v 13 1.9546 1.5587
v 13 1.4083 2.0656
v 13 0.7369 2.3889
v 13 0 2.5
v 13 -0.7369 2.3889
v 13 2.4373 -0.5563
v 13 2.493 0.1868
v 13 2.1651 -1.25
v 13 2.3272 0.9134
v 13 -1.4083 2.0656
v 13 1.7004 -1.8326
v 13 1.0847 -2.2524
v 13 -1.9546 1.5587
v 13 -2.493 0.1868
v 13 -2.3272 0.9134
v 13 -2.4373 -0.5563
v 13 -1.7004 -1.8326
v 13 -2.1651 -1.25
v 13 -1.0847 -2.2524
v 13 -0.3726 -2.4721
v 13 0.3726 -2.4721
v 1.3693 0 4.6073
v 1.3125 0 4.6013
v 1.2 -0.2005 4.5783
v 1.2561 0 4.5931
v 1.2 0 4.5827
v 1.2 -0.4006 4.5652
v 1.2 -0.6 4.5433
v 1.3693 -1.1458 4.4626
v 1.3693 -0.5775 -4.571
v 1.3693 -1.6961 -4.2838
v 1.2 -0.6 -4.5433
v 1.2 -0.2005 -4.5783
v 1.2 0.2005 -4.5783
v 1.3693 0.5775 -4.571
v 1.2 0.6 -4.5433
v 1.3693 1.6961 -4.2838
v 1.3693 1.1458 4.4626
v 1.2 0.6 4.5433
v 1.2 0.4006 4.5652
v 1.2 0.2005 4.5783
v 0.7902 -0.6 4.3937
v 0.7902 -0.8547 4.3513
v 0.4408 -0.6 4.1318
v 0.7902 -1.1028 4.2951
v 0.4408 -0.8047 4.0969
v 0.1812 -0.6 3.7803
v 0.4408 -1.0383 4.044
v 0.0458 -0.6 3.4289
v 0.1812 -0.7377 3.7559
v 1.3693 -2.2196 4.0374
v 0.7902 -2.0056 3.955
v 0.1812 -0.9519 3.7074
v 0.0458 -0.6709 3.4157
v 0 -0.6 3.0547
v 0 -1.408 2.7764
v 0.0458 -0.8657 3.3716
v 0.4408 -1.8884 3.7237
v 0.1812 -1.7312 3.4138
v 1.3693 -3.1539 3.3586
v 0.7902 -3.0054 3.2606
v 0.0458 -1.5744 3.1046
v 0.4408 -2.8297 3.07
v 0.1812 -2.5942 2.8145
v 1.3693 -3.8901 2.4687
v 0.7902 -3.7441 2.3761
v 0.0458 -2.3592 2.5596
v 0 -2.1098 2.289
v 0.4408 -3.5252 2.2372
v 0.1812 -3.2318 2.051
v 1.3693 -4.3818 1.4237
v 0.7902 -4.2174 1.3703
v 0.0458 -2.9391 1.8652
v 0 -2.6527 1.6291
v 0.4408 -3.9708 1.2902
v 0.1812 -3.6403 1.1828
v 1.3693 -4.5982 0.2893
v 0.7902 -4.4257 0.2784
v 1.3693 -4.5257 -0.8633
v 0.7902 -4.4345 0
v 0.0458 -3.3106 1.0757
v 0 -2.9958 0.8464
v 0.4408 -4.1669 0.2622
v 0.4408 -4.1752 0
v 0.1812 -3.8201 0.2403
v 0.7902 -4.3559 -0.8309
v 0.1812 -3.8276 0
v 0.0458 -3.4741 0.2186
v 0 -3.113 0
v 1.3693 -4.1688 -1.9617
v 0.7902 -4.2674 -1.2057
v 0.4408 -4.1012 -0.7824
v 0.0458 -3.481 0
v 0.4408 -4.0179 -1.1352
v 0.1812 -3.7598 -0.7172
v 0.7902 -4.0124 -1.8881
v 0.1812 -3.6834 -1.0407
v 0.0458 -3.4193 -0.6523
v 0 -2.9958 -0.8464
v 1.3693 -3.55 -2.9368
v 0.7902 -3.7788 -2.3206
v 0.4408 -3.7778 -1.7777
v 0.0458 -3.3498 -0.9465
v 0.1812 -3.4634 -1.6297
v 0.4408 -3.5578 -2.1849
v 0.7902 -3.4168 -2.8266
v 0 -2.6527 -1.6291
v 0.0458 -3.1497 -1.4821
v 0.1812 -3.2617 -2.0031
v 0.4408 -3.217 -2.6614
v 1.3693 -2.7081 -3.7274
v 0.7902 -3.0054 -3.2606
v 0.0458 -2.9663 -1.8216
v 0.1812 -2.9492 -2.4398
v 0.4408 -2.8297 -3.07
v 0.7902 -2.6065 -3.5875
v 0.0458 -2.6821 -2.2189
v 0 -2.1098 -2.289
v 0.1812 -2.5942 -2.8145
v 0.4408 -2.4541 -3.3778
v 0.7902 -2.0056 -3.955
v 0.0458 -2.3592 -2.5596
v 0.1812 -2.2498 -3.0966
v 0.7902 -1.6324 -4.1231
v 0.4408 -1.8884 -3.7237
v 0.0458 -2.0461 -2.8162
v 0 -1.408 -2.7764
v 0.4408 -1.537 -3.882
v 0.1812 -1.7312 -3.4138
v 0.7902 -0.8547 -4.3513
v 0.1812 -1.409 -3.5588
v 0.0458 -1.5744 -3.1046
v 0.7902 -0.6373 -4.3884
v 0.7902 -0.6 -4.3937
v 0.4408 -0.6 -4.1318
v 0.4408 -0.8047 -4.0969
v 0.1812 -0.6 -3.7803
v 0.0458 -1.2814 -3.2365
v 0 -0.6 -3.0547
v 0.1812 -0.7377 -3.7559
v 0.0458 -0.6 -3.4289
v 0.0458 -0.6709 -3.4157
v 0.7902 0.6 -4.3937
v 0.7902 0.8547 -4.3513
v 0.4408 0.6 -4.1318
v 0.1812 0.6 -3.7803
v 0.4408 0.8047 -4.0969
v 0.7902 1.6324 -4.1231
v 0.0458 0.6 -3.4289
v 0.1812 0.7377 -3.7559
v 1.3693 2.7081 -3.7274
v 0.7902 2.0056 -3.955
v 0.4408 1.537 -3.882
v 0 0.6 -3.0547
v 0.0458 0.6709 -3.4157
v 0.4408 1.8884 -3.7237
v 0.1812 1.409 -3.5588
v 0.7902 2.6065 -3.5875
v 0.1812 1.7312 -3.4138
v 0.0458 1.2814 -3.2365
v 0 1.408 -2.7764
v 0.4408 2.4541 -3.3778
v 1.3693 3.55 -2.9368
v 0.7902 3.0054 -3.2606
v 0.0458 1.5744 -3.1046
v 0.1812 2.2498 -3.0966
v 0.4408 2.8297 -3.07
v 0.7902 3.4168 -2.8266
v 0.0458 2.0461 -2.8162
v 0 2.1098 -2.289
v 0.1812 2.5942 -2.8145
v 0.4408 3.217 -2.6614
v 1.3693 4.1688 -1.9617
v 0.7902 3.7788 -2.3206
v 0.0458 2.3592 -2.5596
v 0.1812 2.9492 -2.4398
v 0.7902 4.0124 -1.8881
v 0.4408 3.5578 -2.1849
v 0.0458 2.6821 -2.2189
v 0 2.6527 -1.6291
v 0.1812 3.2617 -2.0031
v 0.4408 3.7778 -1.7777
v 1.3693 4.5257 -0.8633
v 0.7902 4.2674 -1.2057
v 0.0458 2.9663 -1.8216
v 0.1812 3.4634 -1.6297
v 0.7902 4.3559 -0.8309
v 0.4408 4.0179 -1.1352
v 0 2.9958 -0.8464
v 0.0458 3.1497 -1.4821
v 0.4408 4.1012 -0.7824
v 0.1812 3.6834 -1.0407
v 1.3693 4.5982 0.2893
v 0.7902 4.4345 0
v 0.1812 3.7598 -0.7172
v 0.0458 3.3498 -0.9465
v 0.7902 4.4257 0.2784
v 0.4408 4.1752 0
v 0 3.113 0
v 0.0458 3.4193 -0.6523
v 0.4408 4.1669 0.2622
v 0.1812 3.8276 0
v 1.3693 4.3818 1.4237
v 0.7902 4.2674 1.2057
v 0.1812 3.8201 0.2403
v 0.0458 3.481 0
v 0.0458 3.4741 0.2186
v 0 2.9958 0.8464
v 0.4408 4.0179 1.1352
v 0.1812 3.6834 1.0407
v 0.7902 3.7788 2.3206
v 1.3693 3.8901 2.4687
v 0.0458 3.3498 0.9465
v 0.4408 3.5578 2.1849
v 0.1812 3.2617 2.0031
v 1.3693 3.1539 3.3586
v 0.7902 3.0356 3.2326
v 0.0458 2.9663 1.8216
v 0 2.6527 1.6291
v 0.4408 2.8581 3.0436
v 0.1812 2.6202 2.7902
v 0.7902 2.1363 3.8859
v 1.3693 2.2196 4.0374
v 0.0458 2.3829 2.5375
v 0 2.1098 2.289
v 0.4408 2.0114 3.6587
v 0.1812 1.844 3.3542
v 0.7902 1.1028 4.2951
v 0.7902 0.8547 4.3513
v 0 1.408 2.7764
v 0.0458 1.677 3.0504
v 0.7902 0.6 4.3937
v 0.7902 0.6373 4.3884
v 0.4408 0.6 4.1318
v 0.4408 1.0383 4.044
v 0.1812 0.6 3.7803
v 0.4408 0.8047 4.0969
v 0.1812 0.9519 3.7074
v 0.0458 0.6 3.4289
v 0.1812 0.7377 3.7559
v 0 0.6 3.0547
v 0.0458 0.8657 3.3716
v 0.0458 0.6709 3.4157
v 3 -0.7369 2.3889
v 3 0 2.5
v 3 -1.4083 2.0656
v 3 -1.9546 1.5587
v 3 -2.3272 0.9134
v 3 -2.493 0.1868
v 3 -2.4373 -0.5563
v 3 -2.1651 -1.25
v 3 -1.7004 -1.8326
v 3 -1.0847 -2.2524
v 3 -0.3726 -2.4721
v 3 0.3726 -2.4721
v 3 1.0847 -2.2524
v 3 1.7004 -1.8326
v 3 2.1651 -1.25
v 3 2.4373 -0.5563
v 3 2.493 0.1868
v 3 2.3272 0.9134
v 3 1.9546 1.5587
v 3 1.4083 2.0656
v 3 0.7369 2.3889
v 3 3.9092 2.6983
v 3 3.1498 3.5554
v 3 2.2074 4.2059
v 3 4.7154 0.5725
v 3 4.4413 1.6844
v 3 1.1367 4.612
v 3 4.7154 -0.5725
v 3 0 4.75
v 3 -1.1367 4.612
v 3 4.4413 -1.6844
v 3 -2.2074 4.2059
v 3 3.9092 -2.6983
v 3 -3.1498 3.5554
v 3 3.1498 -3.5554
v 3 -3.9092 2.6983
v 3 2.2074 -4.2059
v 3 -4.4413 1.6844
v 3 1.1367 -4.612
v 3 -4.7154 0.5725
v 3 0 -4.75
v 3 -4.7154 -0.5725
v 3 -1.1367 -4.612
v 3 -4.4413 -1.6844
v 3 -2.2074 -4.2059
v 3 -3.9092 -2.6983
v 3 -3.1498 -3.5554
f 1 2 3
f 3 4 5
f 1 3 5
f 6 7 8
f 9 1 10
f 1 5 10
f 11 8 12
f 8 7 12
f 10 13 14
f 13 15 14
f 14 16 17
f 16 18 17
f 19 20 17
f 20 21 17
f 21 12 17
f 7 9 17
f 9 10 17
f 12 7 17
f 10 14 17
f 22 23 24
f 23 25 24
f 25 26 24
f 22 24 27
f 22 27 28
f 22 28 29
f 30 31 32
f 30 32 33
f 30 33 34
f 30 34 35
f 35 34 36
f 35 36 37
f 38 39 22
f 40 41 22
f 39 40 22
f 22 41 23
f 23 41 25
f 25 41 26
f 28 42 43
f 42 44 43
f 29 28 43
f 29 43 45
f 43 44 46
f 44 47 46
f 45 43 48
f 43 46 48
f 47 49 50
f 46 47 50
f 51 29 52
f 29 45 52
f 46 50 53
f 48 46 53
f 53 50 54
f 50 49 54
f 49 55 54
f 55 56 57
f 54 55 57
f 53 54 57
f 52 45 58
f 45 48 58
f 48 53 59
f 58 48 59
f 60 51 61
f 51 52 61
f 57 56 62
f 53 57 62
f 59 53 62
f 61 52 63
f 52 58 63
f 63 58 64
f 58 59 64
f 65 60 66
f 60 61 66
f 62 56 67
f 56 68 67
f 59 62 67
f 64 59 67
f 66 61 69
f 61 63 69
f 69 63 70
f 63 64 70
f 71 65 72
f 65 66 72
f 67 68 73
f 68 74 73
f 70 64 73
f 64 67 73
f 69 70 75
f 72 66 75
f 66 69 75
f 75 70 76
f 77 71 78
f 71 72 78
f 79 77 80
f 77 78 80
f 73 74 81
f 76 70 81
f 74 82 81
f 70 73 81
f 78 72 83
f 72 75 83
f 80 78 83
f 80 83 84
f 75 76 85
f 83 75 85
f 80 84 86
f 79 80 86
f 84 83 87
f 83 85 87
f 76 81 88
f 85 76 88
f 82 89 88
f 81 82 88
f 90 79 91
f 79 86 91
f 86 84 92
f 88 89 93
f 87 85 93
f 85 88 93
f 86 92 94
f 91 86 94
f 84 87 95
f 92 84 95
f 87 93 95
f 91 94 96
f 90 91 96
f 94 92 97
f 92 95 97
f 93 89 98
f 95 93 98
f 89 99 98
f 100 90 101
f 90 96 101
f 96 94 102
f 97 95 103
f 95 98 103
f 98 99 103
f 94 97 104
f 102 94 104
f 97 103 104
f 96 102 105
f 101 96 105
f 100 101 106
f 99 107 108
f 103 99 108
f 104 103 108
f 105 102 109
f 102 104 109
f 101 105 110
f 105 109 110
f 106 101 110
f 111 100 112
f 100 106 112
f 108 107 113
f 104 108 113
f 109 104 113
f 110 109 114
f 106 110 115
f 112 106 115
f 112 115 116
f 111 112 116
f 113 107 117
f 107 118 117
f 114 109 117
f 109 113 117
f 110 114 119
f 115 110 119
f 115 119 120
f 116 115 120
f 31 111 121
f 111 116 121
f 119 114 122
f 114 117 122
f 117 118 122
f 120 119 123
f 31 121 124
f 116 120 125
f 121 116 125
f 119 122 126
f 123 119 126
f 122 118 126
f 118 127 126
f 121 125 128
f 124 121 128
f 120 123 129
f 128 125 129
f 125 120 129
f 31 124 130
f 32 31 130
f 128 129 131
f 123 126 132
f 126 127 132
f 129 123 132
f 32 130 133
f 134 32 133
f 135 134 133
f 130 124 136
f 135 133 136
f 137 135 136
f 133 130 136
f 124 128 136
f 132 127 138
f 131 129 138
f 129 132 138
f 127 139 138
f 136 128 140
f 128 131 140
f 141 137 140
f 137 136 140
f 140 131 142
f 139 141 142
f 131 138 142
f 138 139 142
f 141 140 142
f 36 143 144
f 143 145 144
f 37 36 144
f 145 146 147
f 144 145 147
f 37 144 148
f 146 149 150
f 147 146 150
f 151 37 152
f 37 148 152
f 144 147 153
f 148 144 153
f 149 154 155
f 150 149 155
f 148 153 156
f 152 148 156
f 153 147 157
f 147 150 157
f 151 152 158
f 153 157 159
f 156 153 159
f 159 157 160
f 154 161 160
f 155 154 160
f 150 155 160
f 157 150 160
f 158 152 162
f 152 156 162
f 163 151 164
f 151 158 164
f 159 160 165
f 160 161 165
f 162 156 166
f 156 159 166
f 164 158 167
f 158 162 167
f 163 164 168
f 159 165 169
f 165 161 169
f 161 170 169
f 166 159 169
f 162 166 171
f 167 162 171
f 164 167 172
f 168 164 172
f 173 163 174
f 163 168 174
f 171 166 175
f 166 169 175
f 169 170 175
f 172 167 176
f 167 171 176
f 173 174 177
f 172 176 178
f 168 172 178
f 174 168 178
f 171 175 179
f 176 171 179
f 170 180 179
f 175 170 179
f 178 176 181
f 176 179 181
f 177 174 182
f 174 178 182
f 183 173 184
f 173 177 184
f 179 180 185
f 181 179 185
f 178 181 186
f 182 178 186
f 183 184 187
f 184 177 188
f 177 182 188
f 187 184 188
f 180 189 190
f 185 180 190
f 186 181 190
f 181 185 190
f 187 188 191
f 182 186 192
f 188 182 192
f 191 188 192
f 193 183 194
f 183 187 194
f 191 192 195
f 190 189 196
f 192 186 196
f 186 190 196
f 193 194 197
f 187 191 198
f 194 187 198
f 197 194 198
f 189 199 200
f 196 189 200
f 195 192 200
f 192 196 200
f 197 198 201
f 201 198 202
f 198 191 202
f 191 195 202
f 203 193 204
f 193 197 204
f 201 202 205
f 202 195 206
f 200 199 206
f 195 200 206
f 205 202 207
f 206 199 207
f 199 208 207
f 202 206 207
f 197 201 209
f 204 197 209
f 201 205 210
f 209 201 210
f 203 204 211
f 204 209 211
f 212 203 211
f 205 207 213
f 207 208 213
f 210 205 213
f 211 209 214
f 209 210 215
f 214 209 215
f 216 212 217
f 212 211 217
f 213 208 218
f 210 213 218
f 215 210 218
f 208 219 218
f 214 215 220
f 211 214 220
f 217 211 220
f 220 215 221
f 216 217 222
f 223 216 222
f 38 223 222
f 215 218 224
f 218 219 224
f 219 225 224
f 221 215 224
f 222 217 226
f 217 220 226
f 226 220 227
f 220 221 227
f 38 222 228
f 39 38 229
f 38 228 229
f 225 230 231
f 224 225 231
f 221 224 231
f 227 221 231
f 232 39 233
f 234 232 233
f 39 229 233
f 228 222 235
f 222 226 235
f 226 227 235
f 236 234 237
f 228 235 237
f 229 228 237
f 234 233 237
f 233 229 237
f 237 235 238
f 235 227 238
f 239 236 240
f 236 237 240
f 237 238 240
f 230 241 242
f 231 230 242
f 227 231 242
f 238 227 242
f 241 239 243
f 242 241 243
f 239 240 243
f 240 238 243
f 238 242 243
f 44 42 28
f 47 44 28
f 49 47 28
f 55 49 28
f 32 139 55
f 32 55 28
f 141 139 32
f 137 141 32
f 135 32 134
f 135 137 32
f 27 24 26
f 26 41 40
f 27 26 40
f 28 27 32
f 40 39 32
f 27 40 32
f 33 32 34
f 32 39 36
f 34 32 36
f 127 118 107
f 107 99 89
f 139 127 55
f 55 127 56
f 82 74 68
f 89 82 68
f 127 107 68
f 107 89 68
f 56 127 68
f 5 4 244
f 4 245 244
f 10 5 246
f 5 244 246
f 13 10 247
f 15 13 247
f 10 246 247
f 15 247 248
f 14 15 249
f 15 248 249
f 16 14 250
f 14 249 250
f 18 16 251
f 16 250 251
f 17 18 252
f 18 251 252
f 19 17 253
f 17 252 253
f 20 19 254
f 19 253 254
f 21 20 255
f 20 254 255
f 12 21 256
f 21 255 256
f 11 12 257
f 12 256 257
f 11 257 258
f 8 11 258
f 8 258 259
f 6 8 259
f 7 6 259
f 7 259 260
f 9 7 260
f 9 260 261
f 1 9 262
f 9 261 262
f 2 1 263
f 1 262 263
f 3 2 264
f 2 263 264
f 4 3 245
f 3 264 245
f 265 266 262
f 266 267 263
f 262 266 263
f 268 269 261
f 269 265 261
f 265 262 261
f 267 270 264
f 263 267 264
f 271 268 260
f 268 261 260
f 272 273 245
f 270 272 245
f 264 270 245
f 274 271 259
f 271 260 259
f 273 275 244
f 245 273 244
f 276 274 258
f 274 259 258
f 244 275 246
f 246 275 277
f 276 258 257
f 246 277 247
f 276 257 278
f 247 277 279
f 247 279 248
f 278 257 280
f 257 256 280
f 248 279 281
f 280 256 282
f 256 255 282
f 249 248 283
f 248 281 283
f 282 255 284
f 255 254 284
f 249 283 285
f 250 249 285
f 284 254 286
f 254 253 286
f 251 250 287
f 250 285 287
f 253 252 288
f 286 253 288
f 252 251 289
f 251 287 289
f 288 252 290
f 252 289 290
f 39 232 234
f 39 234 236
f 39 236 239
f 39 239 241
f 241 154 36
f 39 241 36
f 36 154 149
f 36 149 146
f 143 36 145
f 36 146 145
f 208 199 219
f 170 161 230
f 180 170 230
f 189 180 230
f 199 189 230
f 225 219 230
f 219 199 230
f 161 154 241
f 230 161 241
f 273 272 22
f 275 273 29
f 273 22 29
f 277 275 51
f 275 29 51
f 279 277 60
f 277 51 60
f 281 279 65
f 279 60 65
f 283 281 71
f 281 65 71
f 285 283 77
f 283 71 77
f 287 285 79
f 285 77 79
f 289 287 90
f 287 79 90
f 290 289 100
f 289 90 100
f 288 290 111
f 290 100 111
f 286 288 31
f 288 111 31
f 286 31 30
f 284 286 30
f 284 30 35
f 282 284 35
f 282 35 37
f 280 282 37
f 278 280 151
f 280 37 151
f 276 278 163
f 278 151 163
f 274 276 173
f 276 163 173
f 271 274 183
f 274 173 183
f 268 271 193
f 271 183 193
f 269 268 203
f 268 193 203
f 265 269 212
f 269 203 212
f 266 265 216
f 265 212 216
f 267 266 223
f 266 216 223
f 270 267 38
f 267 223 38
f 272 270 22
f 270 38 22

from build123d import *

# Parameters (mm, degrees)
FILLET2_R  = 1.5
SKETCH2_W  = 9.5
SKETCH2_H  = 1.2
SLOT_DEPTH = 1.2


with BuildPart() as part:
    # BodySke → Base-Revolve (revolve)
    with BuildSketch(Plane.XY, mode=Mode.PRIVATE) as base_revolve_sk:
        Polygon((3, 2.5), (3, 4.75), (0, 4.487534009), (0, 0), (13, 0), (13, 2.5), align=None)
    revolve(base_revolve_sk.sketch.rotate(Axis((-25.4, 0, 0), (1, 0, 0)), 90), axis=Axis((-25.4, 0, 0), (1, 0, 0)))  # turned: the seam where the file's is

    # Fillet2
    fillet2_edges = [part.edges().sort_by_distance(p)[0] for p in [
        (0, 0, -4.487534009),
    ]]
    fillet(fillet2_edges, radius=FILLET2_R)

    # Sketch2 → Slot (cut)
    with BuildSketch(Plane(origin=(0, 0, 0), x_dir=(0, 0, -1), z_dir=(1, 0, 0))):
        Rectangle(SKETCH2_W, SKETCH2_H)
    extrude(amount=SLOT_DEPTH, mode=Mode.SUBTRACT)


solid = part.part
